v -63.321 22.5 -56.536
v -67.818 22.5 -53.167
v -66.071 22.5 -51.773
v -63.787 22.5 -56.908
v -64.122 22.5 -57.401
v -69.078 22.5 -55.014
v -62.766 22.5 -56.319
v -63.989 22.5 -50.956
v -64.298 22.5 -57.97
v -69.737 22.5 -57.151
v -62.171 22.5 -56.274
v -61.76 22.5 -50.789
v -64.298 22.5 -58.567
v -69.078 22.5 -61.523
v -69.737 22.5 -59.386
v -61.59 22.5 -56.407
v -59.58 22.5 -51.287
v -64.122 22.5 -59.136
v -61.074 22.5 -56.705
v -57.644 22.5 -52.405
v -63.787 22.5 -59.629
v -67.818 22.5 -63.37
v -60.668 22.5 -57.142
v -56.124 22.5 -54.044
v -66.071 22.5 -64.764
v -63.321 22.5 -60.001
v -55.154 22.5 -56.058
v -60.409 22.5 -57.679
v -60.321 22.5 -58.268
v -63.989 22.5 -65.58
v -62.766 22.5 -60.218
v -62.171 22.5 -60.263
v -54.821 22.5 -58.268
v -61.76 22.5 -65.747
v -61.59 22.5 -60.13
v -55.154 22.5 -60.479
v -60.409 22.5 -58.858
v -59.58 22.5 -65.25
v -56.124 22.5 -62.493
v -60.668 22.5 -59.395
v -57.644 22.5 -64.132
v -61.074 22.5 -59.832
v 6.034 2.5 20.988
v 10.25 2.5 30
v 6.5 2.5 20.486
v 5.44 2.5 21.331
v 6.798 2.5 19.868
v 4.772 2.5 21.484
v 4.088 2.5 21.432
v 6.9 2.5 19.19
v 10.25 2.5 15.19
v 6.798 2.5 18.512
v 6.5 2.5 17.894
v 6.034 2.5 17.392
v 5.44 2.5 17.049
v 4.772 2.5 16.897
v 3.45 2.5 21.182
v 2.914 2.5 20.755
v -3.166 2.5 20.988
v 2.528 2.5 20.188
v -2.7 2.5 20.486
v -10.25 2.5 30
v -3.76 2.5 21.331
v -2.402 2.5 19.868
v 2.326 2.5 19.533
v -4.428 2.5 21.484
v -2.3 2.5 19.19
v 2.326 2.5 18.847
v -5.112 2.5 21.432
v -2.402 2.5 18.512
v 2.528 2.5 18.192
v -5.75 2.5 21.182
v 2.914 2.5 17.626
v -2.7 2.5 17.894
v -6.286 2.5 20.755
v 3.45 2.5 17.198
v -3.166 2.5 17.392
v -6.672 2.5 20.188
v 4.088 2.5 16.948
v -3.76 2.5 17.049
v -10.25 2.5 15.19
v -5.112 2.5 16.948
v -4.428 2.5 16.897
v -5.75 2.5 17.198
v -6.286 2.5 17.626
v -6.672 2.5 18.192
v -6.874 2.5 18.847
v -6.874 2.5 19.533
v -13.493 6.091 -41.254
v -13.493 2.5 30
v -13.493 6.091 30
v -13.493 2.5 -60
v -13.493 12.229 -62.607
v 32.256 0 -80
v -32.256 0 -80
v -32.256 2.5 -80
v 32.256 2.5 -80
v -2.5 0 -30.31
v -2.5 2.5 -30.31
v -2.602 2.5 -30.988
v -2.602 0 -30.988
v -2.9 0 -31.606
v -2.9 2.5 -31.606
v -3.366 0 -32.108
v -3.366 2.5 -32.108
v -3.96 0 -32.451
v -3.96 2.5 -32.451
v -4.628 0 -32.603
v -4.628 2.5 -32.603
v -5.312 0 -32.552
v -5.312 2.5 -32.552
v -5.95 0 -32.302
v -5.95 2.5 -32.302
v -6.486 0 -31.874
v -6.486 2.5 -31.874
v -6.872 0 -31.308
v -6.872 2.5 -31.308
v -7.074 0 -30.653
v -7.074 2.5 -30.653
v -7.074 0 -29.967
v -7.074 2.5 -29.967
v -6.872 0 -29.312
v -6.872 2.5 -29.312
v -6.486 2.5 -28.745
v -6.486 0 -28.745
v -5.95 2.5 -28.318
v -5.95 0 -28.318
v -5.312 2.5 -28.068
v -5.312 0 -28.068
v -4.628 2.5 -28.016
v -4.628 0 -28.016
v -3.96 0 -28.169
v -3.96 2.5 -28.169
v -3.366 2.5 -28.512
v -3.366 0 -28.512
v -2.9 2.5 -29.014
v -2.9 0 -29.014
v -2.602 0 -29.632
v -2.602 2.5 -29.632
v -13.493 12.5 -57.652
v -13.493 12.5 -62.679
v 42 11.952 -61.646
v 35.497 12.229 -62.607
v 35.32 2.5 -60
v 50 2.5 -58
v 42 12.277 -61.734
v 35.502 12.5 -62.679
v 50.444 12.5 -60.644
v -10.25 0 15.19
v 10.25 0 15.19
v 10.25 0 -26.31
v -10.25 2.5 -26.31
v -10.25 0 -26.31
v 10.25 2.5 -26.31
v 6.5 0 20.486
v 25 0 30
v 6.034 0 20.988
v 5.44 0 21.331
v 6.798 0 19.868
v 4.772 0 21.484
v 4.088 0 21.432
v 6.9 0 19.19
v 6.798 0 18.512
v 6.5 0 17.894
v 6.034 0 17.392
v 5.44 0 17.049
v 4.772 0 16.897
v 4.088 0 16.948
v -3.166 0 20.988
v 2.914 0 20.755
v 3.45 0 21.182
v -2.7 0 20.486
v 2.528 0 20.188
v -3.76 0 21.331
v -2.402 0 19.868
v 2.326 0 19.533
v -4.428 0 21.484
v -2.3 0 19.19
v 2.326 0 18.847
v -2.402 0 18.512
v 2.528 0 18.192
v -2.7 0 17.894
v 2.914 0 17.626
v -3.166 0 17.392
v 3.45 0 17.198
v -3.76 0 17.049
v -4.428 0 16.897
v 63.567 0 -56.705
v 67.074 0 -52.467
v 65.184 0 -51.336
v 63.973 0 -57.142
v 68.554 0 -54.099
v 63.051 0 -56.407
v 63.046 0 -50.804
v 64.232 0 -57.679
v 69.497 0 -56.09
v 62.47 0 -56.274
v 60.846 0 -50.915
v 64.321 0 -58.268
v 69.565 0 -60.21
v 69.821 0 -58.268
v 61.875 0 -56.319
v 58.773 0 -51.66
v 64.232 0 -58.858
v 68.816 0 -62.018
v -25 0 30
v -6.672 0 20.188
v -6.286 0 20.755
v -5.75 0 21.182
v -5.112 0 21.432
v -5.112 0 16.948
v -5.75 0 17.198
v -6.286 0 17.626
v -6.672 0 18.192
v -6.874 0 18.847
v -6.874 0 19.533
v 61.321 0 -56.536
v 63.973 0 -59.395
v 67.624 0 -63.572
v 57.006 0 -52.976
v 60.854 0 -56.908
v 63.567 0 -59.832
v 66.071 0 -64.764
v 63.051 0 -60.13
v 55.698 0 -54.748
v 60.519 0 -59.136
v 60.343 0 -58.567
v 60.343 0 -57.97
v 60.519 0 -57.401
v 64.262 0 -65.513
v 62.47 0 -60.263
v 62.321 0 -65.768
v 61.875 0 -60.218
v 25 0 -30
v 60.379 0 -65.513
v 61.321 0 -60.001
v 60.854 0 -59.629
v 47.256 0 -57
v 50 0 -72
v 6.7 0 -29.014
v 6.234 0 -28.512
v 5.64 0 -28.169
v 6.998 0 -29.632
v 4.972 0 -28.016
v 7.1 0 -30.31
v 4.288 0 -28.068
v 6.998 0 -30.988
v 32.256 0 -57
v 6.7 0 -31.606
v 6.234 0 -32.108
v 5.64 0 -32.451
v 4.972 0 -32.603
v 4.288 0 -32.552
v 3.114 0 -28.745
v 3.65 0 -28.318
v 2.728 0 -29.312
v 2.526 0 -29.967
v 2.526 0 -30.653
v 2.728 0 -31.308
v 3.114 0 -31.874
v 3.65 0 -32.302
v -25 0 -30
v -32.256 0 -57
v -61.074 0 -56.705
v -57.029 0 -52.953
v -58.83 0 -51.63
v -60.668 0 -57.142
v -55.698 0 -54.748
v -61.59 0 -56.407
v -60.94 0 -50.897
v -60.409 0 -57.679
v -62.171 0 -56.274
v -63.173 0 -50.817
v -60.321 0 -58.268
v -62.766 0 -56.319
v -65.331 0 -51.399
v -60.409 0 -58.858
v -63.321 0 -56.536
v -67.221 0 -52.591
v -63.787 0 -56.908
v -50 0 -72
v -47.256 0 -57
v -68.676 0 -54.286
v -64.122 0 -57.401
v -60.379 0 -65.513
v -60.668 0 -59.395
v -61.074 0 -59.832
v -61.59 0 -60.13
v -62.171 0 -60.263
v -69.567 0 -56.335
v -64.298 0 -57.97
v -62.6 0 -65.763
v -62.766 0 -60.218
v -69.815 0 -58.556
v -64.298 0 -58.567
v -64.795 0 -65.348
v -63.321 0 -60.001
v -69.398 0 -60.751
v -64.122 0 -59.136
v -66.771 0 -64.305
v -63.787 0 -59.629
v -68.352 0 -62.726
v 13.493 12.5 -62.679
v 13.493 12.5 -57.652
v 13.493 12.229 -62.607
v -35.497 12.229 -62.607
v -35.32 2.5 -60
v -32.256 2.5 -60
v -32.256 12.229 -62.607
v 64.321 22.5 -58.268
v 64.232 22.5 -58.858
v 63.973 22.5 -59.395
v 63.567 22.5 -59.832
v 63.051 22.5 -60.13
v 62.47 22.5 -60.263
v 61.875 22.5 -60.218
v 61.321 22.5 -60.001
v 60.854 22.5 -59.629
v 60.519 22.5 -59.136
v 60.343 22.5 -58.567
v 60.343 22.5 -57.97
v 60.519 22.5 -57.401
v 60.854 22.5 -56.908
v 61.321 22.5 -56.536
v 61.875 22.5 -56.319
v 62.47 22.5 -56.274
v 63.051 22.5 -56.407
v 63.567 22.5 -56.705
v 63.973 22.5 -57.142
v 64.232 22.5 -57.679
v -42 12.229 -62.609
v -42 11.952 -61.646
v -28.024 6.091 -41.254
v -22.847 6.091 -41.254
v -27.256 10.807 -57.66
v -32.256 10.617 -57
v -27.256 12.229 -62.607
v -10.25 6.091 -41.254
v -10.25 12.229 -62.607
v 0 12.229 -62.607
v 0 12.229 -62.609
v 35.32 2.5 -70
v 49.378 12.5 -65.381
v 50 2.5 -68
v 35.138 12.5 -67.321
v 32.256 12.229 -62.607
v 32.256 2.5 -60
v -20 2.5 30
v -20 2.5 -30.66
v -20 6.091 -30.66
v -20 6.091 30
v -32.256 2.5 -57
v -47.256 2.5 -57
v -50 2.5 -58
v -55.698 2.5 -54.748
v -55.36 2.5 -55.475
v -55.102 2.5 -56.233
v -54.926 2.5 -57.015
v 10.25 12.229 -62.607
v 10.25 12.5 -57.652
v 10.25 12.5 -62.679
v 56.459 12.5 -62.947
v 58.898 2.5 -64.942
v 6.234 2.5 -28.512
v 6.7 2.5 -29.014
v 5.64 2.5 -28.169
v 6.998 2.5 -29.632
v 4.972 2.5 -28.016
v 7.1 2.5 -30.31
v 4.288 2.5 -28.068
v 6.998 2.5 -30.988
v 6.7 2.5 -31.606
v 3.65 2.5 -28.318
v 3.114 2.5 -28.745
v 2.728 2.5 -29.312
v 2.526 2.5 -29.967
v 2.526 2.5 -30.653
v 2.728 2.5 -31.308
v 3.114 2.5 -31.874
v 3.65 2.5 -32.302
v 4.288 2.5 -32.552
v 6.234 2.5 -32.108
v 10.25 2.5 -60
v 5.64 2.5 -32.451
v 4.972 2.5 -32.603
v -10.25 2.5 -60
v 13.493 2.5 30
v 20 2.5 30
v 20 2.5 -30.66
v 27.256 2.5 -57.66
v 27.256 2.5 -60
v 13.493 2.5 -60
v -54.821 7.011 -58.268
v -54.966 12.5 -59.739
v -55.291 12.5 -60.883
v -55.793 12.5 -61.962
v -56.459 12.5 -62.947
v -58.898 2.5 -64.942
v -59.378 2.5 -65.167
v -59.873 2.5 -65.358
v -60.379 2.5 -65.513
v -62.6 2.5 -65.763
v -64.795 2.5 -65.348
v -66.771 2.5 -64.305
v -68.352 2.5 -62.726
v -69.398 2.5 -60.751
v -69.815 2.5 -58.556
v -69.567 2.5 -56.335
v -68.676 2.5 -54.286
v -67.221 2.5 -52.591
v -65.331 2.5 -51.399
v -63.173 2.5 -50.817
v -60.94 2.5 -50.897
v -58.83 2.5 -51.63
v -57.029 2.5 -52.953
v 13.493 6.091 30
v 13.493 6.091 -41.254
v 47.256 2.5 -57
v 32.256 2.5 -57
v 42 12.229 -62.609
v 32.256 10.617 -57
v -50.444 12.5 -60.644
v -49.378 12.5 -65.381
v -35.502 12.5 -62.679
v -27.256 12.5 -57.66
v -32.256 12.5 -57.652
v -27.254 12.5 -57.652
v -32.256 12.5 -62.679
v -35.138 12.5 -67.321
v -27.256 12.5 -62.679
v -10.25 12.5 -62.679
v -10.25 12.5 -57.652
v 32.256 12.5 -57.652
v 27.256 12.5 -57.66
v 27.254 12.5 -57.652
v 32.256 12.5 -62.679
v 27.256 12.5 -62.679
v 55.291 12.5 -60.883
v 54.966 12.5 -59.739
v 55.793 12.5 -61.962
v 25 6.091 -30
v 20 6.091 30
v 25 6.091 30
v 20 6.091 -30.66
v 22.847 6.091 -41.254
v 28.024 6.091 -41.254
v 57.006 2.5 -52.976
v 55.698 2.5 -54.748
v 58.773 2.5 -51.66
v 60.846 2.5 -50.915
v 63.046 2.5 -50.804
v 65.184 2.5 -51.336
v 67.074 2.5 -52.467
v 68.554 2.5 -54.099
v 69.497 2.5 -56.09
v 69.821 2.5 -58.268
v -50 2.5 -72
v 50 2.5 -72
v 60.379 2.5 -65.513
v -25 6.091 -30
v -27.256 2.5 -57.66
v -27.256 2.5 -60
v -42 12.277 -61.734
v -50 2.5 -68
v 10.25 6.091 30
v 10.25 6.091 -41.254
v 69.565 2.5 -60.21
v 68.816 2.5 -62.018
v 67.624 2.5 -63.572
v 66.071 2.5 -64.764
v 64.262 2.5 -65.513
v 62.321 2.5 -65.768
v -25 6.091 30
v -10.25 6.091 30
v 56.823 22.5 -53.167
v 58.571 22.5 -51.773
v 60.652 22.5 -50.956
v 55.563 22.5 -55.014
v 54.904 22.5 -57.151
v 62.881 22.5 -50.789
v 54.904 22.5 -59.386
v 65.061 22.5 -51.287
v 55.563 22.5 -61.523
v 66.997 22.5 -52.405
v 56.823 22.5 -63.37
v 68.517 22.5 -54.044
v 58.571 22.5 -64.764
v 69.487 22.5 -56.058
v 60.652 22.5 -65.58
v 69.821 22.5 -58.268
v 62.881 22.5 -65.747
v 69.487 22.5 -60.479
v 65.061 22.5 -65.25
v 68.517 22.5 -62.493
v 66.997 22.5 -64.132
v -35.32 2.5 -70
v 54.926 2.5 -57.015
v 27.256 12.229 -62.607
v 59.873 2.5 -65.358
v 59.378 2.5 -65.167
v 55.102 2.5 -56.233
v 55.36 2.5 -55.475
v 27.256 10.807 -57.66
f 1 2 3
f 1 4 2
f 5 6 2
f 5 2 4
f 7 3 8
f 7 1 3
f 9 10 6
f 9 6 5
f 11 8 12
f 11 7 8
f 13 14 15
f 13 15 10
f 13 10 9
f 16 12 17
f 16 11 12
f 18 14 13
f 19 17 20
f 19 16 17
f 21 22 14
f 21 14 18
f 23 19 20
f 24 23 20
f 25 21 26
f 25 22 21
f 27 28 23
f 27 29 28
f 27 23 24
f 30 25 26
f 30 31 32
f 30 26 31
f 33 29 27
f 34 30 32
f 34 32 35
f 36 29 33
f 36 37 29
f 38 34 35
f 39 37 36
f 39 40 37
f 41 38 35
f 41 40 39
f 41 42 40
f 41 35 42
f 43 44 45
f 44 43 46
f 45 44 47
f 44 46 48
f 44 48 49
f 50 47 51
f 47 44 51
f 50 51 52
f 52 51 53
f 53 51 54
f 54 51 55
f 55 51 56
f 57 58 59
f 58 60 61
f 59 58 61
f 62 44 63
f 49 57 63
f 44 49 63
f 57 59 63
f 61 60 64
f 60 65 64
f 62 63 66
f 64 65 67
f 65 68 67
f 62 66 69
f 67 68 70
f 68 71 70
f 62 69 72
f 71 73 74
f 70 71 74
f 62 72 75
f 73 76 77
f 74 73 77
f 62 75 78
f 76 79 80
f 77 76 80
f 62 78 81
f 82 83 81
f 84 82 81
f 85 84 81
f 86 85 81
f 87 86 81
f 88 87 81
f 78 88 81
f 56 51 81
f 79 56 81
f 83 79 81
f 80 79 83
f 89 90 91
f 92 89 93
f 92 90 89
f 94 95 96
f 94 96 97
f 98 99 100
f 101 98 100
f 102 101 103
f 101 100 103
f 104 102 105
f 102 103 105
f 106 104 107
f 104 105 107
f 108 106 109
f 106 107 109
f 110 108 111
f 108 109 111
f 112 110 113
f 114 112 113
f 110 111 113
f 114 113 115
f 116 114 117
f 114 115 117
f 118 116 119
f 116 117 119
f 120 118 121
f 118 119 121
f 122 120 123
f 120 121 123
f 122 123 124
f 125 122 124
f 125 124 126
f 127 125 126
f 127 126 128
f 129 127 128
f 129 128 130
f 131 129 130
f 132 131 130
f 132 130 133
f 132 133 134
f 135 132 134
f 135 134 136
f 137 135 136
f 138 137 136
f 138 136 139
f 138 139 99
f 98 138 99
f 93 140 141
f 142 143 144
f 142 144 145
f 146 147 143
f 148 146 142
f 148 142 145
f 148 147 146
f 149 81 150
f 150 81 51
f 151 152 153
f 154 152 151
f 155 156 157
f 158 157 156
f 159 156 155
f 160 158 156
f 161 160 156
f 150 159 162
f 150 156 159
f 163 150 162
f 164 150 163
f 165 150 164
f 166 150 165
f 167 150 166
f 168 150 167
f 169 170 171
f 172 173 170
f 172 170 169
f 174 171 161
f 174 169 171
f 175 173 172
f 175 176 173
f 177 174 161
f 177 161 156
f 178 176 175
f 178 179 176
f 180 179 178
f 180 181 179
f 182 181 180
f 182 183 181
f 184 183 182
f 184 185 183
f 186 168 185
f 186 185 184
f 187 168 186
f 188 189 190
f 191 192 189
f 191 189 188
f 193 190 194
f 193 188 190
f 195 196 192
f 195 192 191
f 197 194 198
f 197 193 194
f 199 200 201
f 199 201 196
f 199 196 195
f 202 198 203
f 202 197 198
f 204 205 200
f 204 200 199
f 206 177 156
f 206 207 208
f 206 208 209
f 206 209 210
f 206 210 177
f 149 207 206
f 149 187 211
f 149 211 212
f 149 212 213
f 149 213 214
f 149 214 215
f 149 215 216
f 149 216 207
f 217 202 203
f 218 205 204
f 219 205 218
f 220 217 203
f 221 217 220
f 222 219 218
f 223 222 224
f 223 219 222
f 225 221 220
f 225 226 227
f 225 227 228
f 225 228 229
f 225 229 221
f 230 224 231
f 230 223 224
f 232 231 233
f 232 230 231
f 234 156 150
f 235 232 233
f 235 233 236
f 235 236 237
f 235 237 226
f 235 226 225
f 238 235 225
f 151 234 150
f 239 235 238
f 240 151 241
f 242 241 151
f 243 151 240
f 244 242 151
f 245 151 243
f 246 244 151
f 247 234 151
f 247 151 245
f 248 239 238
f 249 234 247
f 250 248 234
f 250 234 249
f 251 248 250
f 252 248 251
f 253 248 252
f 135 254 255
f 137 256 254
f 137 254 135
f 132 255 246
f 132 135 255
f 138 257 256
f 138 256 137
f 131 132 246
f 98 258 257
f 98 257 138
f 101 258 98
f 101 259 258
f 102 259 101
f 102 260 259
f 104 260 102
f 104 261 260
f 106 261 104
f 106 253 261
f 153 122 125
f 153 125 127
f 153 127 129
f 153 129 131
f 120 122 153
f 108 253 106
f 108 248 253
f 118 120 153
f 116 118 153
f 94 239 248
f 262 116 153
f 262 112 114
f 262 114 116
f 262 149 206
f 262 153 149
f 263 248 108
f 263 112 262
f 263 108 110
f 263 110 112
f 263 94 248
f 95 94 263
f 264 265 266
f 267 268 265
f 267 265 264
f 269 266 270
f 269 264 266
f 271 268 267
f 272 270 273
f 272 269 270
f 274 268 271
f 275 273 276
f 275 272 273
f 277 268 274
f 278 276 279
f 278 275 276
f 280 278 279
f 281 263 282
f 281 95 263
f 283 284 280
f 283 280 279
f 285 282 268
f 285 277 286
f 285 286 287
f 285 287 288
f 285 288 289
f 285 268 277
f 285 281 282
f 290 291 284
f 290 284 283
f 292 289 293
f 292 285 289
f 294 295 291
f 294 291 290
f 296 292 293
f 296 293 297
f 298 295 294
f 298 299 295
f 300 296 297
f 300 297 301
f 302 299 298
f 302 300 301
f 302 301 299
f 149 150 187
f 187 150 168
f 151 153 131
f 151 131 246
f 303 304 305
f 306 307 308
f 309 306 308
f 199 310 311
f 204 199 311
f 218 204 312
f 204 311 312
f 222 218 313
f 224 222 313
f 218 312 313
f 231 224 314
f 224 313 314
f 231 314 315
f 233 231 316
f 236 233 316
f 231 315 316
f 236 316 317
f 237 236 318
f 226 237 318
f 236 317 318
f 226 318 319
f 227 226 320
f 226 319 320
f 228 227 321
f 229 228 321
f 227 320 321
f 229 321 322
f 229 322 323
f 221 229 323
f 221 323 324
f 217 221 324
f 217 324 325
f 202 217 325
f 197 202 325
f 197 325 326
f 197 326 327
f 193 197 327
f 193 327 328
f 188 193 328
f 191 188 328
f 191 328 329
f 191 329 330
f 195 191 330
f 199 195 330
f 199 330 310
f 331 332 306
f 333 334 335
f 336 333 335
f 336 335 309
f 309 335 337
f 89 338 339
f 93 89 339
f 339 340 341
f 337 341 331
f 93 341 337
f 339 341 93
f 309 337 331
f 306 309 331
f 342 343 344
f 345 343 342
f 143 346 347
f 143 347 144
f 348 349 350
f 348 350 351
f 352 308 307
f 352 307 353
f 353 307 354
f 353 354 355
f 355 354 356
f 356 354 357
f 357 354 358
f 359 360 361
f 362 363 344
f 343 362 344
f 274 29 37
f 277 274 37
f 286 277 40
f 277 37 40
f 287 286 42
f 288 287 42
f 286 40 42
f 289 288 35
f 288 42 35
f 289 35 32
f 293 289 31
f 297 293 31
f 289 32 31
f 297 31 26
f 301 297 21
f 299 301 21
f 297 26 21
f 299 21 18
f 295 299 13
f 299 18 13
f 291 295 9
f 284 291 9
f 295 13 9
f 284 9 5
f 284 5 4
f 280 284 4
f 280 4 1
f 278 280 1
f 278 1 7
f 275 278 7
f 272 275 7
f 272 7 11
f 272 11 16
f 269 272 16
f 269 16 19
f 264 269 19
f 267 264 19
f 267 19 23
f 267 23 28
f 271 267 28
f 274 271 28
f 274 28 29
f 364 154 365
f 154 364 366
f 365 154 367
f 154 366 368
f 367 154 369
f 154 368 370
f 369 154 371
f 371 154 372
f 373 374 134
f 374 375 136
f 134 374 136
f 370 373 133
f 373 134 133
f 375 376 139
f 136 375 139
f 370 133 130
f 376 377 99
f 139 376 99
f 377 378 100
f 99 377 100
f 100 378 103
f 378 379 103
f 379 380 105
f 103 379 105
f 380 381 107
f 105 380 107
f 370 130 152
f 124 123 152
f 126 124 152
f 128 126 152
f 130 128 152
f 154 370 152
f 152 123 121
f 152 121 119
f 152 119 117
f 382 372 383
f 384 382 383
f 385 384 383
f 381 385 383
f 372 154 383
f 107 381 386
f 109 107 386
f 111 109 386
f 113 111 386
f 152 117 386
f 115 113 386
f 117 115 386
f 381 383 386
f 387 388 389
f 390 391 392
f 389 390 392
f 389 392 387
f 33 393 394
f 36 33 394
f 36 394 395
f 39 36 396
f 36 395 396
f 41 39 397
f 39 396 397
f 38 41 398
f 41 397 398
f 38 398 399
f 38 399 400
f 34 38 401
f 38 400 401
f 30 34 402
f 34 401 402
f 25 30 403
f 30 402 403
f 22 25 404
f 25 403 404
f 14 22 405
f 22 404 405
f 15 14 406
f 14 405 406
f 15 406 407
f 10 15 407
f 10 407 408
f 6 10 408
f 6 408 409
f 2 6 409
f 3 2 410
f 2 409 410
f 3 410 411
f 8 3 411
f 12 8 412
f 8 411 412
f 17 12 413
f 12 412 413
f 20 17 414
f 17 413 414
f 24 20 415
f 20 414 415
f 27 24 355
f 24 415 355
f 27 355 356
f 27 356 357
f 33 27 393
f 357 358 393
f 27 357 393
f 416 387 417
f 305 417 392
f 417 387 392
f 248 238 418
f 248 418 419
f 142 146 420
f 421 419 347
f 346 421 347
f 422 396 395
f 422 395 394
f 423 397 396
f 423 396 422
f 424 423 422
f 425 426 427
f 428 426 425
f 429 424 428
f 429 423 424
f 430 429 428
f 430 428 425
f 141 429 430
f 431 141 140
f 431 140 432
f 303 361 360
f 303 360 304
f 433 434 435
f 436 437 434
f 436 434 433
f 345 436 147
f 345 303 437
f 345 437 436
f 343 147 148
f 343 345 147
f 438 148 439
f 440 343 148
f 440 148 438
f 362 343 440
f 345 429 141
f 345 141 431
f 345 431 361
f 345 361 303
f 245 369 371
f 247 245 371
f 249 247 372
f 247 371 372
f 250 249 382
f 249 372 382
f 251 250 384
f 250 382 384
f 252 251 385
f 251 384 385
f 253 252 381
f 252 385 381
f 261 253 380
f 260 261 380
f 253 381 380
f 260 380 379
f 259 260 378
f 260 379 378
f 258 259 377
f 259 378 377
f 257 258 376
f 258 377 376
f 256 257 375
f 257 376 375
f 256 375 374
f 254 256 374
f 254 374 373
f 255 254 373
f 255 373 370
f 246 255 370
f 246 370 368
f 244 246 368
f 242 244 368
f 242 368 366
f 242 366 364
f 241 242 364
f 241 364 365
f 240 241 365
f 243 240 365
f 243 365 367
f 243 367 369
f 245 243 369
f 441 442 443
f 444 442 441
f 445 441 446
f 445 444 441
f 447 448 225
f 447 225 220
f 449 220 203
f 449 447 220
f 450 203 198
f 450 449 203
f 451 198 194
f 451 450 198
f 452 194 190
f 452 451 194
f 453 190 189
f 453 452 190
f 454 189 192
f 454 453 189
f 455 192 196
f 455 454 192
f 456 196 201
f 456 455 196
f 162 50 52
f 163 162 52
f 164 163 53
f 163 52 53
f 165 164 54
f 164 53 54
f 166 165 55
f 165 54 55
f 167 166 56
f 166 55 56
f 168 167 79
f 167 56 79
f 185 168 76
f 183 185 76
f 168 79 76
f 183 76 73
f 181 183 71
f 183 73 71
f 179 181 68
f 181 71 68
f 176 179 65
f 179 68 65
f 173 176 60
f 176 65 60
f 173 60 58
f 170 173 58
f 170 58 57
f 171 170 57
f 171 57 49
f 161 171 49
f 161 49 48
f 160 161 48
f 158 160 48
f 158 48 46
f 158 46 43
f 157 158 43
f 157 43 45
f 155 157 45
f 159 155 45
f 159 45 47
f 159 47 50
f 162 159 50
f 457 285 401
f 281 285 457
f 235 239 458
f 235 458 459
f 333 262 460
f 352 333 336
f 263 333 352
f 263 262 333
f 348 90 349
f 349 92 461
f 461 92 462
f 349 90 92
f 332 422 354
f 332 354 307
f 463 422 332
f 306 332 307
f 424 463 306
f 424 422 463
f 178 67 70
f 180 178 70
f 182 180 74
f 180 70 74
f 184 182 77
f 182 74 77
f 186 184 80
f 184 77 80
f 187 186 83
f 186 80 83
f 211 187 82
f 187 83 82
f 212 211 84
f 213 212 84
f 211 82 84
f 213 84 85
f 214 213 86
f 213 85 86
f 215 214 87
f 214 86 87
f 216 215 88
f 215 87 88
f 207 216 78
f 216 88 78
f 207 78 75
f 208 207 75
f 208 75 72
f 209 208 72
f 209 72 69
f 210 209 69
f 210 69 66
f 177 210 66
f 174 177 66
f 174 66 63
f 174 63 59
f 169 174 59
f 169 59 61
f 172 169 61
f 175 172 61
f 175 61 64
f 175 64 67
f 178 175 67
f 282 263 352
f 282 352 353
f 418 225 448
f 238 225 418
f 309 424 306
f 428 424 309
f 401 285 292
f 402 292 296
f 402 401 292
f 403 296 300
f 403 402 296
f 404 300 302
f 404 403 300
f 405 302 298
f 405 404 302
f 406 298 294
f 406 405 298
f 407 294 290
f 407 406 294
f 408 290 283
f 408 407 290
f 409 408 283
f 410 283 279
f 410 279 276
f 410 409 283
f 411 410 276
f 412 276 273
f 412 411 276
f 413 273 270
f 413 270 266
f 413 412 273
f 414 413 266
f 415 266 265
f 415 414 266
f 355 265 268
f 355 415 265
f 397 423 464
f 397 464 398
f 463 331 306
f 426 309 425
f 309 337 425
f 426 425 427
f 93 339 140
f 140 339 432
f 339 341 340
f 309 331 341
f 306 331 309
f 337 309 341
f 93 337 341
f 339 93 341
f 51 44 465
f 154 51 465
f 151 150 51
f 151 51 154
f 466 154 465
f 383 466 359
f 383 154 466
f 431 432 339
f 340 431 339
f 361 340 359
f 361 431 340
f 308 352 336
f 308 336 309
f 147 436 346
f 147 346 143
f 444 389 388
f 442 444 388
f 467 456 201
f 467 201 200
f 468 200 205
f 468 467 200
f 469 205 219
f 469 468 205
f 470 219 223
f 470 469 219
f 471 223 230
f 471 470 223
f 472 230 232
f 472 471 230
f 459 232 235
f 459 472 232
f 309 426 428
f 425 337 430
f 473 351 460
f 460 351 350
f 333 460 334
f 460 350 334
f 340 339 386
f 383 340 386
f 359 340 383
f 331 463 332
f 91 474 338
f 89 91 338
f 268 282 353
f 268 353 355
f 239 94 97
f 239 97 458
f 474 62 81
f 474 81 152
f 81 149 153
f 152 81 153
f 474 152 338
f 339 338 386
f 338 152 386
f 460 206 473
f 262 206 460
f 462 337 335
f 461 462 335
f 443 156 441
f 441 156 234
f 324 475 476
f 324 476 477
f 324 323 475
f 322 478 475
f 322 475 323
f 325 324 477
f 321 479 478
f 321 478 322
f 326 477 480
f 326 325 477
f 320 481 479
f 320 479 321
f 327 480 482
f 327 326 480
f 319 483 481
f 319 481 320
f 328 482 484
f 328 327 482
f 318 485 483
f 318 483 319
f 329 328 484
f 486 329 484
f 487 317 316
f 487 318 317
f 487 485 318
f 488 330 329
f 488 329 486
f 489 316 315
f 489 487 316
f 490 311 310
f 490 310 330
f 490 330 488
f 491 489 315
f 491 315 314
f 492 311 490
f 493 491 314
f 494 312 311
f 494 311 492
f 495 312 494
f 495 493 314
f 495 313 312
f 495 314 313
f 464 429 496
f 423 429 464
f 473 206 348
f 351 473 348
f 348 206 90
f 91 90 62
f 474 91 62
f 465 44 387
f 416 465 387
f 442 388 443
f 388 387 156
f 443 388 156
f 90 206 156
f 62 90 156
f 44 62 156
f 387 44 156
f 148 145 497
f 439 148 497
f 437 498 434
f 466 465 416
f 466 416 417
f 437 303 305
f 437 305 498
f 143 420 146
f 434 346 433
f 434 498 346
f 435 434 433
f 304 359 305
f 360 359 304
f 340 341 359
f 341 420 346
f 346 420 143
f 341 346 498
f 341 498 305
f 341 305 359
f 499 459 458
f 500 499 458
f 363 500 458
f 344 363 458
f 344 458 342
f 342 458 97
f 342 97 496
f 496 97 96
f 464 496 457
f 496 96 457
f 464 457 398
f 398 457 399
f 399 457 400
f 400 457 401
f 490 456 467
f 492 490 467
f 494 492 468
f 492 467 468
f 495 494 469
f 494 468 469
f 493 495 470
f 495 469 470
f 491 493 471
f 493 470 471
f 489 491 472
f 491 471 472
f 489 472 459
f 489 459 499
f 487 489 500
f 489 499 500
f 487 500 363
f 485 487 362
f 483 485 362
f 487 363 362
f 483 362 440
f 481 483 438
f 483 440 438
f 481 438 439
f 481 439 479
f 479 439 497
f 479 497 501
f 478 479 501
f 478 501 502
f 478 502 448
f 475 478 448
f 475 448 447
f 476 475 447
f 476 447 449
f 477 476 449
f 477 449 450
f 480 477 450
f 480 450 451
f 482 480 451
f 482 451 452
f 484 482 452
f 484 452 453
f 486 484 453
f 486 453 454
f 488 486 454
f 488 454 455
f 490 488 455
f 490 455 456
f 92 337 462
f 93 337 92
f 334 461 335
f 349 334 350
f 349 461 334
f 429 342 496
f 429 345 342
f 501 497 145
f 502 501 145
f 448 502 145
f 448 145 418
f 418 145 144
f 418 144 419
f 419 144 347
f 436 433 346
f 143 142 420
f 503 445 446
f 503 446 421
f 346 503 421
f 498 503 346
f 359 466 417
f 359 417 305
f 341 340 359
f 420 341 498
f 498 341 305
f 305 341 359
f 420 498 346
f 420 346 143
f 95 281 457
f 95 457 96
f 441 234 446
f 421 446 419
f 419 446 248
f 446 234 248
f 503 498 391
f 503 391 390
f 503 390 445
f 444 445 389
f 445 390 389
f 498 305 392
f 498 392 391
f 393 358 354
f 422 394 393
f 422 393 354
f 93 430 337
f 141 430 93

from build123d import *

# Parameters (mm, degrees)
BOSS_EXTRUDE1_DEPTH      = 2.5
SKETCH2_W                = 20.5
SKETCH2_H                = 41.5
CUT_EXTRUDE1_DEPTH       = 3.5
SKETCH8_R                = 2.3
CUT_EXTRUDE2_DEPTH       = 3.5
BOSS_EXTRUDE2_DEPTH      = 10
BOSS_EXTRUDE2_TAPER      = 15
SKETCH10_R               = 7.5
BOSS_EXTRUDE3_DEPTH      = 20
BOSS_EXTRUDE3_DEPTH_BACK = 2.5
SKETCH11_R               = 2
CUT_EXTRUDE3_DEPTH       = 23.5
BOSS_EXTRUDE7_DEPTH      = 10
CUT_EXTRUDE4_DEPTH       = 42
CUT_EXTRUDE4_DEPTH_BACK  = 42


with BuildPart() as part:
    # Sketch1 → Boss-Extrude1 (new body)
    with BuildSketch(Plane(origin=(0, 0, 0), x_dir=(1, 0, 0), z_dir=(0, 1, 0))):
        Polygon((-25, 30), (-32.256053395, 57), (-47.256053395, 57), (-66, 52), (-66, 62), (-50, 72), (-32.256053395, 80), (32.256053395, 80), (50, 72), (66, 62), (66, 52), (47.256053395, 57), (32.256053395, 57), (25, 30), (25, -30), (-25, -30), align=None)
    extrude(amount=BOSS_EXTRUDE1_DEPTH)

    # Sketch2 → Cut-Extrude1 (cut, through all)
    with BuildSketch(Plane(origin=(0, 2.5, 0), x_dir=(1, 0, 0), z_dir=(0, 1, 0))):
        with Locations((0, 5.559891181)):
            Rectangle(SKETCH2_W, SKETCH2_H)
    extrude(amount=-CUT_EXTRUDE1_DEPTH, mode=Mode.SUBTRACT)

    # Sketch8 → Cut-Extrude2 (cut, through all)
    with BuildSketch(Plane(origin=(0, 2.5, 0), x_dir=(1, 0, 0), z_dir=(0, 1, 0))):
        with Locations((-4.8, 30.309891181)):
            Circle(SKETCH8_R)
        with Locations((4.8, 30.309891181)):
            Circle(SKETCH8_R)
        with Locations((-4.6, -19.190108819)):
            Circle(SKETCH8_R)
        with Locations((4.6, -19.190108819)):
            Circle(SKETCH8_R)
    extrude(amount=-CUT_EXTRUDE2_DEPTH, mode=Mode.SUBTRACT)

    # Sketch9 → Boss-Extrude2 (add)
    with BuildSketch(Plane(origin=(0, 2.5, 0), x_dir=(1, 0, 0), z_dir=(0, 1, 0))):
        Polygon((-65, 62.845048963), (-65, 55), (-50, 58), (-35.31985343, 60), (35.31985343, 60), (50, 58), (65, 55), (65, 62.845048963), (50, 68), (35.31985343, 70), (-35.31985343, 70), (-50, 68), align=None)
    extrude(amount=BOSS_EXTRUDE2_DEPTH, taper=BOSS_EXTRUDE2_TAPER)

    # Sketch10 → Boss-Extrude3 (add, two sides)
    with BuildSketch(Plane(origin=(0, 2.5, 0), x_dir=(1, 0, 0), z_dir=(0, 1, 0))) as boss_extrude3_sk:
        with Locations((-62.320508076, 58.268454707)):
            Circle(SKETCH10_R)
        with Locations((62.320508076, 58.268454707)):
            Circle(SKETCH10_R)
    extrude(amount=BOSS_EXTRUDE3_DEPTH)
    extrude(boss_extrude3_sk.sketch, amount=-BOSS_EXTRUDE3_DEPTH_BACK)

    # Sketch11 → Cut-Extrude3 (cut, through all)
    with BuildSketch(Plane(origin=(0, 22.5, 0), x_dir=(1, 0, 0), z_dir=(0, 1, 0))):
        with Locations((-62.320508076, 58.268454707)):
            Circle(SKETCH11_R)
        with Locations((62.320508076, 58.268454707)):
            Circle(SKETCH11_R)
    extrude(amount=-CUT_EXTRUDE3_DEPTH, mode=Mode.SUBTRACT)

    # Sketch12 → Boss-Extrude7 (add)
    with BuildSketch(Plane(origin=(0, 2.5, 0), x_dir=(1, 0, 0), z_dir=(0, 1, 0))):
        Polygon((-25, -30), (-25, 30), (-32.256053395, 57), (-32.256053395, 65.259387318), (-27.256053395, 65.259387318), (-27.256053395, 57.660145211), (-20, 30.660145211), (-20, -30), align=None)
        Polygon((-10.25, -15.190108819), (-10.25, -30), (-13.493333109, -30), (-13.493333109, 64.72993517), (-10.25, 64.72993517), (-10.25, 26.309891181), align=None)
    boss_extrude7 = extrude(amount=BOSS_EXTRUDE7_DEPTH)

    # Mirror2: Boss-Extrude7 across plane
    add(boss_extrude7.mirror(Plane(origin=(0, 0, 0), x_dir=(0, 0, 1), z_dir=(1, 0, 0))))

    # Sketch13 → Cut-Extrude4 (cut, two sides)
    with BuildSketch(Plane(origin=(0, 0, 0), x_dir=(0, 0, -1), z_dir=(1, 0, 0))) as cut_extrude4_sk:
        Polygon((-30, 6.091325502), (41.254032245, 6.091325502), (62.608757253, 12.229145442), (-30, 17.289989114), align=None)
    extrude(amount=CUT_EXTRUDE4_DEPTH, mode=Mode.SUBTRACT)
    extrude(cut_extrude4_sk.sketch, amount=-CUT_EXTRUDE4_DEPTH_BACK, mode=Mode.SUBTRACT)


solid = part.part
